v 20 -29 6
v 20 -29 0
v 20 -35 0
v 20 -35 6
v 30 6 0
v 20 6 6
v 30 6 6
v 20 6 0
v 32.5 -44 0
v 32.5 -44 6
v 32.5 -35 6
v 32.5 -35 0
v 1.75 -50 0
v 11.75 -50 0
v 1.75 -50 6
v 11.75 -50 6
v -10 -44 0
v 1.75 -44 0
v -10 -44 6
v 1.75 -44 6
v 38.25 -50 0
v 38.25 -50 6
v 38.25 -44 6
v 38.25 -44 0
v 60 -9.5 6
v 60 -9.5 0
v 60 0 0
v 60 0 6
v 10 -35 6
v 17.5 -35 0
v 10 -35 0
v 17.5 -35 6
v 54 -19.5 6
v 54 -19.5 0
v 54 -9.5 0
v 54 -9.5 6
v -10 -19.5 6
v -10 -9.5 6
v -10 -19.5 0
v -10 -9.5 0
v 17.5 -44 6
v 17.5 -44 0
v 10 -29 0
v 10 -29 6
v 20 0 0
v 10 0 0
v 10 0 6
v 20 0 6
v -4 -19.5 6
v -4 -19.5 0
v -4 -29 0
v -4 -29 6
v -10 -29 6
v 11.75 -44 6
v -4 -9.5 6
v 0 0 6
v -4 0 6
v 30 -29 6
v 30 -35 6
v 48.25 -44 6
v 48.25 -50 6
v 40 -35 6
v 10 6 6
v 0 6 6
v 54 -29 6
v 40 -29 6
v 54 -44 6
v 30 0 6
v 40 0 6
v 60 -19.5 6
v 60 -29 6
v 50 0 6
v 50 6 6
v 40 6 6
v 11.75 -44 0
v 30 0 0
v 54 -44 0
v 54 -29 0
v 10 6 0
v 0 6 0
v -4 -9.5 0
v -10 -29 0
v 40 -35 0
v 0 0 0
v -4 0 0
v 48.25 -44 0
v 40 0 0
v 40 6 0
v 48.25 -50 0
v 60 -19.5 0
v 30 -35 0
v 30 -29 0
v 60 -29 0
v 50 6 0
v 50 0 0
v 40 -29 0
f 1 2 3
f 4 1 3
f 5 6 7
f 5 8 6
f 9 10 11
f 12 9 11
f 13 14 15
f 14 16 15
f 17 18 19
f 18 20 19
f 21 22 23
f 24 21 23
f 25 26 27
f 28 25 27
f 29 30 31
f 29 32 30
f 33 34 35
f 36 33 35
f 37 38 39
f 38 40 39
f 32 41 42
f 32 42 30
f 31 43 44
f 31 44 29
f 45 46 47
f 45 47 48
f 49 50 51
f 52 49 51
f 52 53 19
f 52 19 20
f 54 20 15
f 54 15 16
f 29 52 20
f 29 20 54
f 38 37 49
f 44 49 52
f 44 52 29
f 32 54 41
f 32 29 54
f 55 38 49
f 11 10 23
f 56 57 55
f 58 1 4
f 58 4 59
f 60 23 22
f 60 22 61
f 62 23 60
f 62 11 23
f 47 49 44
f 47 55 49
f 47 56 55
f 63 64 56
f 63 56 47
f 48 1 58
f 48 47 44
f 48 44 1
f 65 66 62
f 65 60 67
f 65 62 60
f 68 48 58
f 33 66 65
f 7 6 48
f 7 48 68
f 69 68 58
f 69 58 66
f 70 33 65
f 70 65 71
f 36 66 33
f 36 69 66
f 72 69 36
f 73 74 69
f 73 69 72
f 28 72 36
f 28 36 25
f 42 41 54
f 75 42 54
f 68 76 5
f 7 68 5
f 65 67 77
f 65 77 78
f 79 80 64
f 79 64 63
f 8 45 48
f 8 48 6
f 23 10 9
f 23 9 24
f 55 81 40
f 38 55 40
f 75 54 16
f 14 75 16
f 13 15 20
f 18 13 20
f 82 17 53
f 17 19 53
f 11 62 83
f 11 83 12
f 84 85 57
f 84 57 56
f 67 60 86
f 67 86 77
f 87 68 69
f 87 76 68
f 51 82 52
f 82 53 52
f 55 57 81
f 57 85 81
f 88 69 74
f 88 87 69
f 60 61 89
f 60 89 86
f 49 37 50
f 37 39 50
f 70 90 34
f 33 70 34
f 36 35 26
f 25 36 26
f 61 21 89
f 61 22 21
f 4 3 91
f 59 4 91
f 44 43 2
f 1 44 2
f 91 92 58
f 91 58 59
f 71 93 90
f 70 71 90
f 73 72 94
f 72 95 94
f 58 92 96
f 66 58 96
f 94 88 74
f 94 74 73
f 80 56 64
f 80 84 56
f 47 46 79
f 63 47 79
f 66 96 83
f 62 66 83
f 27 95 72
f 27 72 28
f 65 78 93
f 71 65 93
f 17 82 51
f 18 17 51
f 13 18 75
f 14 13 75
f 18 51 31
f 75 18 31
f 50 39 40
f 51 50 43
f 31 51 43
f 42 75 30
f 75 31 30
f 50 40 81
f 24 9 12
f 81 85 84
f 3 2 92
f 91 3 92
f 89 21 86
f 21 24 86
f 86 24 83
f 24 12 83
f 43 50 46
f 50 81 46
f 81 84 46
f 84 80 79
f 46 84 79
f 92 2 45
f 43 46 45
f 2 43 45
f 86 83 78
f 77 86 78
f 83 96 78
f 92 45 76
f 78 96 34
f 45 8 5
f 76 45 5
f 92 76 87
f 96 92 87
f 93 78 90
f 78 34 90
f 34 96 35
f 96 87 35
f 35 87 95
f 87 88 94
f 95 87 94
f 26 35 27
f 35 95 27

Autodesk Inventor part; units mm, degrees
ref_plane "YZ Plane" through (0, 0, 0) normal (1, 0, 0) x (0, 1, 0)
ref_plane "XZ Plane" through (0, 0, 0) normal (0, 1, 0) x (-1, 0, 0)
ref_plane "XY Plane" through (0, 0, 0) normal (0, 0, 1) x (1, 0, 0)
ref_plane "Work Plane1" through (20, 0, 0) normal (0, 0, 1) x (1, 0, 0)
sketch "Sketch1" plane through (20, 0, 0) normal (0, 0, 1) x (1, 0, 0)
  line L0 (-20, 0) -> (-10, 0)
  line L1 (-10, 0) -> (-10, 6)
  line L2 (-20, 6) -> (-10, 6)
  line L3 (-20, 0) -> (-20, 6)
  line L4 (0, 0) -> (10, 0)
  line L5 (10, 0) -> (10, 6)
  line L6 (0, 6) -> (10, 6)
  line L7 (0, 0) -> (0, 6)
  line L8 (20, 0) -> (30, 0)
  line L9 (30, 0) -> (30, 6)
  line L10 (20, 6) -> (30, 6)
  line L11 (20, 0) -> (20, 6)
  line L12 (-30, 0) -> (-24, 0)
  line L13 (-24, 0) -> (-24, 6)
  line L14 (-30, 6) -> (-24, 6)
  line L15 (-30, 0) -> (-30, 6)
  line L16 (-30, 0) -> (-20, 0)
  line L17 (-10, 0) -> (0, 0)
  line L18 (10, 0) -> (20, 0)
  line L19 (30, 0) -> (40, 0)
  line L20 (40, 0) -> (-24, 0)
  line L21 (-24, 0) -> (-24, -29)
  line L22 (-24, -29) -> (40, -29)
  line L23 (40, -29) -> (40, 0)
  line L24 (-24, -9.5) -> (-30, -9.5)
  line L25 (-30, -9.5) -> (-30, -19.5)
  line L26 (-30, -19.5) -> (-24, -19.5)
  line L27 (-24, -19.5) -> (-24, -9.5)
  line L28 (40, -19.5) -> (34, -19.5)
  line L29 (34, -19.5) -> (34, -9.5)
  line L30 (34, -9.5) -> (40, -9.5)
  line L31 (40, -9.5) -> (40, -19.5)
  line L32 (-24, -14.5) -> (40, -14.5) construction
  line L33 (-20, -29) -> (-10, -29)
  line L34 (-10, -29) -> (-10, -35)
  line L35 (-20, -35) -> (-10, -35)
  line L36 (-20, -29) -> (-20, -35)
  line L37 (0, -29) -> (10, -29)
  line L38 (10, -29) -> (10, -35)
  line L39 (0, -35) -> (10, -35)
  line L40 (0, -29) -> (0, -35)
  line L41 (20, -29) -> (30, -29)
  line L42 (30, -29) -> (30, -35)
  line L43 (20, -35) -> (30, -35)
  line L44 (20, -29) -> (20, -35)
  line L45 (-10, -29) -> (0, -29)
  line L46 (10, -29) -> (20, -29)
  point P0 (-30, -14.5)
  point P1 (34, -14.5)
  dimension "d0" = 29
  dimension "d1" = 6
  dimension "d2" = 10
sketch "Sketch2" plane through (20, 0, 6) normal (0, 0, 1) x (1, 0, 0)
  line L0 (-24, -44) -> (-24, -29)
  line L1 (-18.25, -44) -> (-30, -44)
  line L2 (-2.5, -44) -> (-8.25, -44)
  line L3 (-2.5, -35.5) -> (-2.5, -44)
  line L4 (12, -35) -> (-2, -35)
  line L5 (10, -35) -> (0, -35) construction
  line L6 (5, -35) -> (5, 6) construction
  line L7 (0, 6) -> (10, 6) construction
  line L8 (40, -19.5) -> (34, -19.5)
  line L9 (34, -19.5) -> (34, -9.5)
  line L10 (34, -9.5) -> (40, -9.5)
  line L11 (40, 0) -> (40, -9.5)
  line L12 (30, 0) -> (40, 0)
  line L13 (30, 6) -> (30, 0)
  line L14 (20, 6) -> (30, 6)
  line L15 (20, 0) -> (20, 6)
  line L16 (10, 0) -> (20, 0)
  line L17 (10, 6) -> (10, 0)
  line L18 (0, 6) -> (10, 6)
  line L19 (0, 0) -> (0, 6)
  line L20 (-10, 0) -> (0, 0)
  line L21 (-10, 6) -> (-10, 0)
  line L22 (-20, 6) -> (-10, 6)
  line L23 (-20, 0) -> (-20, 6)
  line L24 (-24, 0) -> (-20, 0)
  line L25 (-24, -9.5) -> (-24, 0)
  line L26 (-30, -9.5) -> (-24, -9.5)
  line L27 (-30, -19.5) -> (-30, -9.5)
  line L28 (-24, -19.5) -> (-30, -19.5)
  line L29 (-24, -29) -> (-24, -19.5)
  line L30 (-20, -29) -> (-24, -29)
  line L31 (-20, -35) -> (-20, -29)
  line L32 (-10, -35) -> (-20, -35)
  line L33 (-10, -29) -> (-10, -35)
  line L34 (0, -29) -> (-10, -29)
  line L35 (0, -35) -> (0, -29)
  line L36 (10, -35) -> (0, -35)
  line L37 (10, -29) -> (10, -35)
  line L38 (20, -29) -> (10, -29)
  line L39 (20, -35) -> (20, -29)
  line L40 (30, -35) -> (20, -35)
  line L41 (30, -29) -> (30, -35)
  line L42 (40, -29) -> (30, -29)
  line L43 (40, -19.5) -> (40, -29)
  line L44 (-2.5, -44) -> (-2.5, -35)
  line L45 (-2.5, -35) -> (0, -35)
  line L46 (-8.25, -50) -> (-18.25, -50)
  line L47 (-18.25, -50) -> (-18.25, -44)
  line L48 (34, -44) -> (34, -29)
  line L49 (12.5, -44) -> (18.25, -44)
  line L50 (12.5, -35.5) -> (12.5, -44)
  line L51 (30, -29) -> (34, -29)
  line L52 (30, -35) -> (30, -29)
  line L53 (20, -35) -> (30, -35)
  line L54 (20, -29) -> (20, -35)
  line L55 (10, -29) -> (20, -29)
  line L56 (10, -35) -> (10, -29)
  line L57 (12.5, -44) -> (12.5, -35)
  line L58 (12.5, -35) -> (10, -35)
  line L59 (18.25, -50) -> (28.25, -50)
  line L60 (28.25, -50) -> (28.25, -44)
  line L61 (28.25, -44) -> (34, -44)
  line L62 (-24, -29) -> (-20, -29)
  line L63 (-20, -35) -> (-20, -29)
  line L64 (-20, -35) -> (-20, -29)
  line L65 (-20, -35) -> (-10, -35)
  line L66 (-10, -35) -> (-10, -29)
  line L67 (0, -29) -> (-10, -29)
  line L68 (0, -29) -> (0, -35)
  line L69 (-8.25, -44) -> (-8.25, -50)
  line L70 (18.25, -50) -> (18.25, -44)
  line L71 (34, -44) -> (34, -29)
  line L72 (28.25, -44) -> (40, -44)
  line L73 (12.5, -44) -> (18.25, -44)
  line L74 (12.5, -35.5) -> (12.5, -44)
  line L75 (30, -29) -> (34, -29)
  line L76 (30, -35) -> (30, -29)
  line L77 (20, -35) -> (30, -35)
  line L78 (20, -29) -> (20, -35)
  line L79 (10, -29) -> (20, -29)
  line L80 (10, -35) -> (10, -29)
  line L81 (12.5, -44) -> (12.5, -35)
  line L82 (12.5, -35) -> (10, -35)
  line L83 (18.25, -50) -> (28.25, -50)
  line L84 (28.25, -50) -> (28.25, -44)
  line L85 (34, -29) -> (30, -29)
  line L86 (30, -35) -> (30, -29)
  line L87 (30, -35) -> (30, -29)
  line L88 (30, -35) -> (20, -35)
  line L89 (20, -35) -> (20, -29)
  line L90 (10, -29) -> (20, -29)
  line L91 (10, -29) -> (10, -35)
  line L92 (18.25, -44) -> (18.25, -50)
  line L93 (-24, -44) -> (-30, -44)
  line L94 (-30, -44) -> (-30, -29)
  line L95 (-30, -29) -> (-24, -29)
  line L96 (-24, -29) -> (-24, -44)
  line L97 (-10, -29) -> (0, -29)
  line L98 (0, -29) -> (0, -35)
  line L99 (0, -35) -> (-10, -35)
  line L100 (-10, -35) -> (-10, -29)
  line L101 (20, -29) -> (10, -29)
  line L102 (10, -29) -> (20, -29)
  line L103 (20, -29) -> (20, -35)
  line L104 (20, -35) -> (10, -35)
  line L105 (10, -35) -> (10, -29)
  line L106 (30, -29) -> (34, -29)
  line L107 (34, -29) -> (34, -35)
  line L108 (34, -35) -> (30, -35)
  line L109 (30, -35) -> (30, -29)
  line L110 (-20, -29) -> (-24, -29)
  line L111 (-24, -29) -> (-24, -35)
  line L112 (-24, -35) -> (-20, -35)
  line L113 (-20, -35) -> (-20, -29)
  line L114 (30, -35) -> (20, -35)
  point P0 (-2.5, -49.5)
  point P1 (12.5, -49.5)
  point P2 (12.5, -49.5)
  dimension "d4" = 10
  dimension "d6" = 6
  dimension "d12" = 6
  dimension "d13" = 15
extrude "Plate1" add sketch "Sketch1" along normal blind 6 contours L3 L2 L1 L0 | L0 L17 L4 L18 L8 L19 L23 L30 L29 L28 L22 L21 L16 | L7 L6 L5 L4 | L21 L26 L25 L24 | L11 L10 L9 L8 | L22 L34 L35 L36 | L22 L38 L39 L40 | L22 L42 L43 L44
sheet face with bend "Face2" sketch "Sketch2" thickness 6 toward (0, 0, -1) bend radius 6 contours L1 L94 L95 L0 | L0 L112 L32 L99 L44 L3 L2 L69 L46 L47 L1 | L0 L30 L31 L112 | L104 L40 L108 L48 L61 L60 L59 L70 L49 L50 L57 | L41 L42 L48 L108
bend "Bend1"
equation "\"d12\" = d6"
equation "\"d3\" = Thickness"
equation "\"d7\" = BendRadius"
equation "\"d8\" = BendReliefWidth"
equation "\"d10\" = MinimumRemnant"
equation "\"d9\" = BendReliefDepth"
equation "\"d11\" = TransitionRadius"
equation "\"BendRadius\" = Thickness"
equation "\"BendReliefWidth\" = Thickness"
equation "\"BendReliefDepth\" = 0.5 * Thickness"
equation "\"CornerReliefSize\" = 4 * Thickness"
equation "\"MinimumRemnant\" = 2 * Thickness"
equation "\"TransitionRadius\" = BendRadius"
equation "\"JacobiRadiusSize\" = BendRadius"
equation "\"GapSize\" = Thickness"
equation "\"Thickness\" = 6"
properties part number "jotstick behuizing zijkant" material "Wood (Birch)"
